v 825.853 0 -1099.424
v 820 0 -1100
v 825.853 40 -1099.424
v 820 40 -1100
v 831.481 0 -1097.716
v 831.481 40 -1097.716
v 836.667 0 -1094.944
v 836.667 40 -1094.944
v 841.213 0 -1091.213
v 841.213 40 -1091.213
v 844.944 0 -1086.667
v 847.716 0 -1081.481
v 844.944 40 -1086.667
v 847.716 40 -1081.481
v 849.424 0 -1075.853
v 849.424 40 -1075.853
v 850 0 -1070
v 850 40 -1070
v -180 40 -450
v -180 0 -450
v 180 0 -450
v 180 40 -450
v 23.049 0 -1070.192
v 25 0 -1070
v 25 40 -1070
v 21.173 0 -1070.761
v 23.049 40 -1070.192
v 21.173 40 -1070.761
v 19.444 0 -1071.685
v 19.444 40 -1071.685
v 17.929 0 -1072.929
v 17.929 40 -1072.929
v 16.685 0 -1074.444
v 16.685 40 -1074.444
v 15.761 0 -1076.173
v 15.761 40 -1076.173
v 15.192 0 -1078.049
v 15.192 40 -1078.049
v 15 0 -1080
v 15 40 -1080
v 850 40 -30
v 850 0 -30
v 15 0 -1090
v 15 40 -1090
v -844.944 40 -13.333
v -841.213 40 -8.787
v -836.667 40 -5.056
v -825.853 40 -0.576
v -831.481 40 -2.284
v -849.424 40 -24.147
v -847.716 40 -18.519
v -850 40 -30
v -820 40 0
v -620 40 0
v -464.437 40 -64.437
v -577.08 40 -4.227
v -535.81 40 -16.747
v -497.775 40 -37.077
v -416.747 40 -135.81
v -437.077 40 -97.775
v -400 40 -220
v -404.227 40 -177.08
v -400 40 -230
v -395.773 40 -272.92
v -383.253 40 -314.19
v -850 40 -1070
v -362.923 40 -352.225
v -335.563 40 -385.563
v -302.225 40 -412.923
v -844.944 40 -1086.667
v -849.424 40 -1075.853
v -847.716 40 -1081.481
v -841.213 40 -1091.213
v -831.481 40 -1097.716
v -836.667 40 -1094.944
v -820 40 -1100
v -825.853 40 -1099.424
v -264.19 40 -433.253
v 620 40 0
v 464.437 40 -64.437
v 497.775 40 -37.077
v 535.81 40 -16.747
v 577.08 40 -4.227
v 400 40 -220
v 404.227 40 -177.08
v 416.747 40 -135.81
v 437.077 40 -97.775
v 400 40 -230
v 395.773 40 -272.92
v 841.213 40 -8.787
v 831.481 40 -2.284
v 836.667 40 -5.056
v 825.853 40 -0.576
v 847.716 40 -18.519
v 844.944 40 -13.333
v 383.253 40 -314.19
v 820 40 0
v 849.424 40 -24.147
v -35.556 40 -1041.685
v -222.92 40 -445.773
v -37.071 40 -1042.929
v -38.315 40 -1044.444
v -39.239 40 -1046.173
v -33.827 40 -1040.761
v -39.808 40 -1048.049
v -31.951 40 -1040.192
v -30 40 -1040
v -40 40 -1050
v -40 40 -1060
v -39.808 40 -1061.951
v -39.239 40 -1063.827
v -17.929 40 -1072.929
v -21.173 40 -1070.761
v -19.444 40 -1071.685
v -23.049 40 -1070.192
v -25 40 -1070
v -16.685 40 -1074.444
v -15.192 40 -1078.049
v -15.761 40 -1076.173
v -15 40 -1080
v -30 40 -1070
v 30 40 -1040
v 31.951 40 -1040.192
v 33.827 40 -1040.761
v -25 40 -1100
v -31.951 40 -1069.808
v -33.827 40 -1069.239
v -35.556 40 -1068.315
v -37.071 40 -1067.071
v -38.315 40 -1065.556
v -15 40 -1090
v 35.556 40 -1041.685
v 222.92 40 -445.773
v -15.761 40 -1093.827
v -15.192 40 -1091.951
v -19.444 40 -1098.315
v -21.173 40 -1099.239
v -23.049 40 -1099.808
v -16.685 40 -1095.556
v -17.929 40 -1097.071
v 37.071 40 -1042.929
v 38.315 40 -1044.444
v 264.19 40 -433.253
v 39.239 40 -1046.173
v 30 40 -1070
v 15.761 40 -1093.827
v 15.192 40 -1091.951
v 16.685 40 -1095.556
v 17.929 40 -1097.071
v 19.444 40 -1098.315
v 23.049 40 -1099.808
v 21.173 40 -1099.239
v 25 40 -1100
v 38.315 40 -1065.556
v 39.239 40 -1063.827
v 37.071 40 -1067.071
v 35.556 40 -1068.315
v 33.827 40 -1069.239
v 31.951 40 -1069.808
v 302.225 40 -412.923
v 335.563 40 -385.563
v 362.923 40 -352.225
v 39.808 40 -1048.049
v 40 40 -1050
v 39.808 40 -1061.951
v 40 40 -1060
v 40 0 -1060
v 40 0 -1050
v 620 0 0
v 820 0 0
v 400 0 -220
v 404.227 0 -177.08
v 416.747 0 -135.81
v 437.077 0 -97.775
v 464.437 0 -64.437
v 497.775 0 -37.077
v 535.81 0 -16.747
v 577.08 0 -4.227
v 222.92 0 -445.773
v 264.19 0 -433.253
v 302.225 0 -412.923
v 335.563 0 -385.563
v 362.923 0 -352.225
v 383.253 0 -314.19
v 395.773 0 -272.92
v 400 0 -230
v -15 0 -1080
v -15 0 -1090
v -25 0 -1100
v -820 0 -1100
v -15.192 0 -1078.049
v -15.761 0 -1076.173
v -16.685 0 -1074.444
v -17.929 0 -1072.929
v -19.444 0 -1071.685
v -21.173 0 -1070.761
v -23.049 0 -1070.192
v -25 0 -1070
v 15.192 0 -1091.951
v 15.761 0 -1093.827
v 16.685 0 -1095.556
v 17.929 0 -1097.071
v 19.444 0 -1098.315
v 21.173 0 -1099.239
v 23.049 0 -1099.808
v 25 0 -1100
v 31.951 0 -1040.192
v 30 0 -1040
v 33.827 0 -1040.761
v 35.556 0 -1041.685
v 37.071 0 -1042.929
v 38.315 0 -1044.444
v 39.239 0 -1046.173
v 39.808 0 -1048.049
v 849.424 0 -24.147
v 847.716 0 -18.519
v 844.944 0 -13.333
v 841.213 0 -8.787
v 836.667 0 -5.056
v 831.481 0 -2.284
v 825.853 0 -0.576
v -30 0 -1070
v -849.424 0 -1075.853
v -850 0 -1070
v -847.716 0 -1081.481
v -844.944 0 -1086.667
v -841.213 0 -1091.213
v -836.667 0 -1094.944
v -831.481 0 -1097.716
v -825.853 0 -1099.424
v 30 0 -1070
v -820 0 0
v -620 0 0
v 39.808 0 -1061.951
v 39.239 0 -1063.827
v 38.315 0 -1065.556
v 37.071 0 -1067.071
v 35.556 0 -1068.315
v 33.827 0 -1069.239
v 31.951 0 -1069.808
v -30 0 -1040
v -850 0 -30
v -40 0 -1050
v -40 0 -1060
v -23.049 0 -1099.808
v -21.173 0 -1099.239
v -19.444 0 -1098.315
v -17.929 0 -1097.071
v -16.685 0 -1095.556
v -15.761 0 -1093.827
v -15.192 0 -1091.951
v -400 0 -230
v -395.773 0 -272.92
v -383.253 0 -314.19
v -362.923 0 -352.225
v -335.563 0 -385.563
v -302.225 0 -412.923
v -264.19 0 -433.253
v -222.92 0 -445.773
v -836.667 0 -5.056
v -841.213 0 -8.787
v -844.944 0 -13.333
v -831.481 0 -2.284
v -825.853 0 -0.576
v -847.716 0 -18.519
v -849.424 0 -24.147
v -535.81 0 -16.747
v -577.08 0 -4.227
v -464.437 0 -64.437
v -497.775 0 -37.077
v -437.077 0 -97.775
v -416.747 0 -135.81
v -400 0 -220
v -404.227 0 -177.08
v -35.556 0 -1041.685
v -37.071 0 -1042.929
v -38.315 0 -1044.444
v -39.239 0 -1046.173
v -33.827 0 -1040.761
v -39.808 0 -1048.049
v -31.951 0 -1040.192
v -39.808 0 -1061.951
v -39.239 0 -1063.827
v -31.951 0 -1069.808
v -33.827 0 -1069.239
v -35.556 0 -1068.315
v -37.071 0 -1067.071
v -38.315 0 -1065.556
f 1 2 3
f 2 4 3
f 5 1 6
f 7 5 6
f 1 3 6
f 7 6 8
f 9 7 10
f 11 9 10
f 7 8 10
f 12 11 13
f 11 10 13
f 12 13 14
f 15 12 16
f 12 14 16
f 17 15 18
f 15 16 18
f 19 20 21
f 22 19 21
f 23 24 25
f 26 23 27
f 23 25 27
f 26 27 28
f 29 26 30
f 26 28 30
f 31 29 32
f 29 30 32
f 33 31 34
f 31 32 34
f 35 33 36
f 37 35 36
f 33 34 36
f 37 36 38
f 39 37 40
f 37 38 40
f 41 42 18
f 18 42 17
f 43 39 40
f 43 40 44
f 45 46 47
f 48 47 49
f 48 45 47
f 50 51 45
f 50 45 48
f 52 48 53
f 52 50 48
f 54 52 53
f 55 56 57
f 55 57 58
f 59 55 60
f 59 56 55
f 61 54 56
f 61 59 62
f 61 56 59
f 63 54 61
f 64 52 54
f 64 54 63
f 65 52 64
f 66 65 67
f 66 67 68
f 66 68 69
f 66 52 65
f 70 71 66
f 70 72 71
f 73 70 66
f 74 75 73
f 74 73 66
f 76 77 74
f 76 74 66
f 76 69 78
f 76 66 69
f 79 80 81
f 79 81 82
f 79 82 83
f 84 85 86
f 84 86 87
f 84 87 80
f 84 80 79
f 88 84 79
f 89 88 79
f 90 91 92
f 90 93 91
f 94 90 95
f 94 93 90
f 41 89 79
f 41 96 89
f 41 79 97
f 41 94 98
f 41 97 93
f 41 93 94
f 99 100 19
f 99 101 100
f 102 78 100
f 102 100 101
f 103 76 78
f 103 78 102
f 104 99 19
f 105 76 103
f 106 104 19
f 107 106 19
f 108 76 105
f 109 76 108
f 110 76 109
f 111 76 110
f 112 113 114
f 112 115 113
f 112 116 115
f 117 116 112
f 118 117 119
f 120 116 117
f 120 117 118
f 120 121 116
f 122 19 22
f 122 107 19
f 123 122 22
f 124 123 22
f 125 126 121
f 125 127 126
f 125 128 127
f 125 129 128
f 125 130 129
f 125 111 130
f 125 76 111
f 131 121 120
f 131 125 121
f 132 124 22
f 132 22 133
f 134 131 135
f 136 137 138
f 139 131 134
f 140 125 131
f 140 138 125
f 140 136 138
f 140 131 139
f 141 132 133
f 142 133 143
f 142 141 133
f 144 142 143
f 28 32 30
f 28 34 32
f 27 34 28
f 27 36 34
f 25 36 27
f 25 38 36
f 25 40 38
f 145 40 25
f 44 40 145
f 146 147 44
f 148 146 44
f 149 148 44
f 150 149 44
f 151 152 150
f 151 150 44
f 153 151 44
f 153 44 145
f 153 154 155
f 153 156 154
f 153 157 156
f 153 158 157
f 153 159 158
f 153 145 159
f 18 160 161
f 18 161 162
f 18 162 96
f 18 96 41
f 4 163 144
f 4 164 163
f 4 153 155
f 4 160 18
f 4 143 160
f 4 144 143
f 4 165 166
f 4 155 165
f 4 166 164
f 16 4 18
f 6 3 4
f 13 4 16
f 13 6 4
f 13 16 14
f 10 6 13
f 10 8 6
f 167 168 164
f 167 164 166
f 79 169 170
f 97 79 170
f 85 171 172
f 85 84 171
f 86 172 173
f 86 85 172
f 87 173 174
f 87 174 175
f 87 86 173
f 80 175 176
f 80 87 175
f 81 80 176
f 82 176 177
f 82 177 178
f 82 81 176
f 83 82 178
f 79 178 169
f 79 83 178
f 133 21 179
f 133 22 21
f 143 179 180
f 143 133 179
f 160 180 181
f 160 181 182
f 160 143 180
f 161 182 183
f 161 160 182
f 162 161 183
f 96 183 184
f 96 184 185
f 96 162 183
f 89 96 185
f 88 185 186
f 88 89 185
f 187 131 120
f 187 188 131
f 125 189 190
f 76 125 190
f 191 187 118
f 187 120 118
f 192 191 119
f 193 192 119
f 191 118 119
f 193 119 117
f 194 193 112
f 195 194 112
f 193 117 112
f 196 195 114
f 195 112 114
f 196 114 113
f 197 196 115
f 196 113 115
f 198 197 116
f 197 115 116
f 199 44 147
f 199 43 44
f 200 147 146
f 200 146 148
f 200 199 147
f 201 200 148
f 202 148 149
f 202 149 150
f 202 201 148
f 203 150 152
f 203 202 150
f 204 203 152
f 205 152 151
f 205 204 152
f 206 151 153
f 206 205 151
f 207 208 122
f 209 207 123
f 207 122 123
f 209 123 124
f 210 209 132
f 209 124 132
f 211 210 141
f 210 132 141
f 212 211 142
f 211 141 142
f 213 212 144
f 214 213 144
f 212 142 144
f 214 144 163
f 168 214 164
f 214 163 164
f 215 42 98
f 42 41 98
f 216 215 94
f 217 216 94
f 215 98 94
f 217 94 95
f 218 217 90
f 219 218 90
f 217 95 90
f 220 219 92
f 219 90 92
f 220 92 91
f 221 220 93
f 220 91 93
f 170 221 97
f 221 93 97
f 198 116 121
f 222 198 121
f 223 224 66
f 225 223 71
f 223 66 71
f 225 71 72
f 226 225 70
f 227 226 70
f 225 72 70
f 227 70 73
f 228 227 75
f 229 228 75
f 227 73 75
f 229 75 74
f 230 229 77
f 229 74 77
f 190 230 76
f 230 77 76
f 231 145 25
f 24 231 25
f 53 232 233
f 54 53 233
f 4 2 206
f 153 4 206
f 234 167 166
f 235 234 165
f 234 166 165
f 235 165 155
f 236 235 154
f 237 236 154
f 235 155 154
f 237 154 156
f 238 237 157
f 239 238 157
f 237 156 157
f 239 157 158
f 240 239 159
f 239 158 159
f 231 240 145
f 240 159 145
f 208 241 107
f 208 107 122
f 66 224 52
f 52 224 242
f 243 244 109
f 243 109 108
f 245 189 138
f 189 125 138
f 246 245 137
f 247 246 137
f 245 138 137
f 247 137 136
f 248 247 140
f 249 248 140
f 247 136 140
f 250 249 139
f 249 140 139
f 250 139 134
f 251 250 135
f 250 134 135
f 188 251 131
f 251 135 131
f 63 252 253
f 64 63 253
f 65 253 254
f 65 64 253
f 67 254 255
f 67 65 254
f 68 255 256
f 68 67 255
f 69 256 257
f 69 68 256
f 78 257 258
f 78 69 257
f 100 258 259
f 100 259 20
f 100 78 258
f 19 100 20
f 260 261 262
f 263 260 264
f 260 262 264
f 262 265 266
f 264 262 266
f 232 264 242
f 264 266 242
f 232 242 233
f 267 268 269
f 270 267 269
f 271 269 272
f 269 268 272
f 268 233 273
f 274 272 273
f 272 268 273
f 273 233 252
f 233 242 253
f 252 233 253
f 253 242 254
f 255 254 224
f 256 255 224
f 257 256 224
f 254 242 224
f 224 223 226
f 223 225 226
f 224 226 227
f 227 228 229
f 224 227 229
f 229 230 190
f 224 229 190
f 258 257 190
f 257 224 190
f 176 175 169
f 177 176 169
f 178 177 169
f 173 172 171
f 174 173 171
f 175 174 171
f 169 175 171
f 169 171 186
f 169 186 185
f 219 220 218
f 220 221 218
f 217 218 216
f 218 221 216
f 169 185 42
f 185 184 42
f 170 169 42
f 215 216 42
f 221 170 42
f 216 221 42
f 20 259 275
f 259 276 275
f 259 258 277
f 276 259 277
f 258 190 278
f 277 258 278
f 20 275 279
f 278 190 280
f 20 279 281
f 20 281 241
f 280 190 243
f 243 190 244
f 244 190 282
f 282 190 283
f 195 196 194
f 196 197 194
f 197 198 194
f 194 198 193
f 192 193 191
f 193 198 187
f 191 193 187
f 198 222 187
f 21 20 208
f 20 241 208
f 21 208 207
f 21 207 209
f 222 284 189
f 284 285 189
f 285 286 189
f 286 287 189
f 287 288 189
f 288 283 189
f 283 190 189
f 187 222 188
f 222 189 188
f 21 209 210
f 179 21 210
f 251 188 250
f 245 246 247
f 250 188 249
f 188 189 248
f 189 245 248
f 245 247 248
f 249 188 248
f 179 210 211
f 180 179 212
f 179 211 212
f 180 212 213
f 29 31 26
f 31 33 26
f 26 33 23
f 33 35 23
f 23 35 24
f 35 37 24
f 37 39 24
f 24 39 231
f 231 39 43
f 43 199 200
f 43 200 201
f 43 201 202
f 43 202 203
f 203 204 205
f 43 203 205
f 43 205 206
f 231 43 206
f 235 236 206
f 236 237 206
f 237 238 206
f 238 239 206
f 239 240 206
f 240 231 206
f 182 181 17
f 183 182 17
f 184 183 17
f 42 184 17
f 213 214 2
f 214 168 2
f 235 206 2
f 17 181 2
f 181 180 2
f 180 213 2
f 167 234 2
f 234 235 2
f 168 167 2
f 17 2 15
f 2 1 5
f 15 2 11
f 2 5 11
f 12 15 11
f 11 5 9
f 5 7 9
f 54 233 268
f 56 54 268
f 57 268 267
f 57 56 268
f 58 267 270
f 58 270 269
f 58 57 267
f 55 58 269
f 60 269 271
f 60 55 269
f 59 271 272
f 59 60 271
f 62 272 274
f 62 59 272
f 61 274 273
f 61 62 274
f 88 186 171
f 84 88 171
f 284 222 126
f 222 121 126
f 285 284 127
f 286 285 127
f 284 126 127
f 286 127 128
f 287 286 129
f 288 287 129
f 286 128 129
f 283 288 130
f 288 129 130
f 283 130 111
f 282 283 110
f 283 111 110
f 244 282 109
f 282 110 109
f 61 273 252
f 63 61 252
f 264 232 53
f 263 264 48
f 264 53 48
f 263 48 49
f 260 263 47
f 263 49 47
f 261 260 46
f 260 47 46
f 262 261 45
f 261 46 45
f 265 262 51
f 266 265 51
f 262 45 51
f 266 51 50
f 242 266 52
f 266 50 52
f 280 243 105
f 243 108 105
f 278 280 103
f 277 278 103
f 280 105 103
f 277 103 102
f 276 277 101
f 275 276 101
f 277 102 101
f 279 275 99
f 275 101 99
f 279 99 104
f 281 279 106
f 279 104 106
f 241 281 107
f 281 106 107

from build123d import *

# Parameters (mm, degrees)
BOSS_EXTRUDE1_DEPTH     = 40
FILLET1_R               = 220
FILLET2_R               = 30
CUT_EXTRUDE1_DEPTH      = 1391.71923838
CUT_EXTRUDE1_DEPTH_BACK = 1391.71923838
FILLET3_R               = 10


with BuildPart() as part:
    # Sketch1 → Boss-Extrude1 (new body)
    with BuildSketch(Plane(origin=(0, 0, 0), x_dir=(1, 0, 0), z_dir=(0, 1, 0))):
        Polygon((850, 1100), (-850, 1100), (-850, 0), (-400, 0), (-400, 450), (400, 450), (400, 0), (850, 0), align=None)
    extrude(amount=BOSS_EXTRUDE1_DEPTH)

    # Fillet1
    fillet1_edges = [part.edges().sort_by_distance(p)[0] for p in [
        (-400, 20, -450),
        (-400, 20, 0),
        (400, 20, 0),
        (400, 20, -450),
    ]]
    fillet(fillet1_edges, radius=FILLET1_R)

    # Fillet2
    fillet2_edges = [part.edges().sort_by_distance(p)[0] for p in [
        (-850, 20, 0),
        (-850, 20, -1100),
        (850, 20, -1100),
        (850, 20, 0),
    ]]
    fillet(fillet2_edges, radius=FILLET2_R)

    # Sketch2 → Cut-Extrude1 (cut, two sides: drawn at the far end of the back side and taken through both)
    with BuildSketch(Plane(origin=(0, 40, 0), x_dir=(1, 0, 0), z_dir=(0, 1, 0)).offset(-CUT_EXTRUDE1_DEPTH_BACK)):
        Polygon((-15, 3908.73185568), (-15, 1100), (-15, 1070), (-40, 1070), (-40, 1040), (40, 1040), (40, 1070), (15, 1070), (15, 1100), (15, 3908.73185568), (15, 9526.195567041), (-15, 9526.195567041), align=None)
    extrude(amount=CUT_EXTRUDE1_DEPTH + CUT_EXTRUDE1_DEPTH_BACK, mode=Mode.SUBTRACT)

    # Fillet3
    fillet3_edges = [part.edges().sort_by_distance(p)[0] for p in [
        (-15, 20, -1070),
        (-40, 20, -1070),
        (-40, 20, -1040),
        (40, 20, -1040),
        (40, 20, -1070),
        (15, 20, -1070),
        (15, 20, -1100),
        (-15, 20, -1100),
    ]]
    fillet(fillet3_edges, radius=FILLET3_R)


solid = part.part
